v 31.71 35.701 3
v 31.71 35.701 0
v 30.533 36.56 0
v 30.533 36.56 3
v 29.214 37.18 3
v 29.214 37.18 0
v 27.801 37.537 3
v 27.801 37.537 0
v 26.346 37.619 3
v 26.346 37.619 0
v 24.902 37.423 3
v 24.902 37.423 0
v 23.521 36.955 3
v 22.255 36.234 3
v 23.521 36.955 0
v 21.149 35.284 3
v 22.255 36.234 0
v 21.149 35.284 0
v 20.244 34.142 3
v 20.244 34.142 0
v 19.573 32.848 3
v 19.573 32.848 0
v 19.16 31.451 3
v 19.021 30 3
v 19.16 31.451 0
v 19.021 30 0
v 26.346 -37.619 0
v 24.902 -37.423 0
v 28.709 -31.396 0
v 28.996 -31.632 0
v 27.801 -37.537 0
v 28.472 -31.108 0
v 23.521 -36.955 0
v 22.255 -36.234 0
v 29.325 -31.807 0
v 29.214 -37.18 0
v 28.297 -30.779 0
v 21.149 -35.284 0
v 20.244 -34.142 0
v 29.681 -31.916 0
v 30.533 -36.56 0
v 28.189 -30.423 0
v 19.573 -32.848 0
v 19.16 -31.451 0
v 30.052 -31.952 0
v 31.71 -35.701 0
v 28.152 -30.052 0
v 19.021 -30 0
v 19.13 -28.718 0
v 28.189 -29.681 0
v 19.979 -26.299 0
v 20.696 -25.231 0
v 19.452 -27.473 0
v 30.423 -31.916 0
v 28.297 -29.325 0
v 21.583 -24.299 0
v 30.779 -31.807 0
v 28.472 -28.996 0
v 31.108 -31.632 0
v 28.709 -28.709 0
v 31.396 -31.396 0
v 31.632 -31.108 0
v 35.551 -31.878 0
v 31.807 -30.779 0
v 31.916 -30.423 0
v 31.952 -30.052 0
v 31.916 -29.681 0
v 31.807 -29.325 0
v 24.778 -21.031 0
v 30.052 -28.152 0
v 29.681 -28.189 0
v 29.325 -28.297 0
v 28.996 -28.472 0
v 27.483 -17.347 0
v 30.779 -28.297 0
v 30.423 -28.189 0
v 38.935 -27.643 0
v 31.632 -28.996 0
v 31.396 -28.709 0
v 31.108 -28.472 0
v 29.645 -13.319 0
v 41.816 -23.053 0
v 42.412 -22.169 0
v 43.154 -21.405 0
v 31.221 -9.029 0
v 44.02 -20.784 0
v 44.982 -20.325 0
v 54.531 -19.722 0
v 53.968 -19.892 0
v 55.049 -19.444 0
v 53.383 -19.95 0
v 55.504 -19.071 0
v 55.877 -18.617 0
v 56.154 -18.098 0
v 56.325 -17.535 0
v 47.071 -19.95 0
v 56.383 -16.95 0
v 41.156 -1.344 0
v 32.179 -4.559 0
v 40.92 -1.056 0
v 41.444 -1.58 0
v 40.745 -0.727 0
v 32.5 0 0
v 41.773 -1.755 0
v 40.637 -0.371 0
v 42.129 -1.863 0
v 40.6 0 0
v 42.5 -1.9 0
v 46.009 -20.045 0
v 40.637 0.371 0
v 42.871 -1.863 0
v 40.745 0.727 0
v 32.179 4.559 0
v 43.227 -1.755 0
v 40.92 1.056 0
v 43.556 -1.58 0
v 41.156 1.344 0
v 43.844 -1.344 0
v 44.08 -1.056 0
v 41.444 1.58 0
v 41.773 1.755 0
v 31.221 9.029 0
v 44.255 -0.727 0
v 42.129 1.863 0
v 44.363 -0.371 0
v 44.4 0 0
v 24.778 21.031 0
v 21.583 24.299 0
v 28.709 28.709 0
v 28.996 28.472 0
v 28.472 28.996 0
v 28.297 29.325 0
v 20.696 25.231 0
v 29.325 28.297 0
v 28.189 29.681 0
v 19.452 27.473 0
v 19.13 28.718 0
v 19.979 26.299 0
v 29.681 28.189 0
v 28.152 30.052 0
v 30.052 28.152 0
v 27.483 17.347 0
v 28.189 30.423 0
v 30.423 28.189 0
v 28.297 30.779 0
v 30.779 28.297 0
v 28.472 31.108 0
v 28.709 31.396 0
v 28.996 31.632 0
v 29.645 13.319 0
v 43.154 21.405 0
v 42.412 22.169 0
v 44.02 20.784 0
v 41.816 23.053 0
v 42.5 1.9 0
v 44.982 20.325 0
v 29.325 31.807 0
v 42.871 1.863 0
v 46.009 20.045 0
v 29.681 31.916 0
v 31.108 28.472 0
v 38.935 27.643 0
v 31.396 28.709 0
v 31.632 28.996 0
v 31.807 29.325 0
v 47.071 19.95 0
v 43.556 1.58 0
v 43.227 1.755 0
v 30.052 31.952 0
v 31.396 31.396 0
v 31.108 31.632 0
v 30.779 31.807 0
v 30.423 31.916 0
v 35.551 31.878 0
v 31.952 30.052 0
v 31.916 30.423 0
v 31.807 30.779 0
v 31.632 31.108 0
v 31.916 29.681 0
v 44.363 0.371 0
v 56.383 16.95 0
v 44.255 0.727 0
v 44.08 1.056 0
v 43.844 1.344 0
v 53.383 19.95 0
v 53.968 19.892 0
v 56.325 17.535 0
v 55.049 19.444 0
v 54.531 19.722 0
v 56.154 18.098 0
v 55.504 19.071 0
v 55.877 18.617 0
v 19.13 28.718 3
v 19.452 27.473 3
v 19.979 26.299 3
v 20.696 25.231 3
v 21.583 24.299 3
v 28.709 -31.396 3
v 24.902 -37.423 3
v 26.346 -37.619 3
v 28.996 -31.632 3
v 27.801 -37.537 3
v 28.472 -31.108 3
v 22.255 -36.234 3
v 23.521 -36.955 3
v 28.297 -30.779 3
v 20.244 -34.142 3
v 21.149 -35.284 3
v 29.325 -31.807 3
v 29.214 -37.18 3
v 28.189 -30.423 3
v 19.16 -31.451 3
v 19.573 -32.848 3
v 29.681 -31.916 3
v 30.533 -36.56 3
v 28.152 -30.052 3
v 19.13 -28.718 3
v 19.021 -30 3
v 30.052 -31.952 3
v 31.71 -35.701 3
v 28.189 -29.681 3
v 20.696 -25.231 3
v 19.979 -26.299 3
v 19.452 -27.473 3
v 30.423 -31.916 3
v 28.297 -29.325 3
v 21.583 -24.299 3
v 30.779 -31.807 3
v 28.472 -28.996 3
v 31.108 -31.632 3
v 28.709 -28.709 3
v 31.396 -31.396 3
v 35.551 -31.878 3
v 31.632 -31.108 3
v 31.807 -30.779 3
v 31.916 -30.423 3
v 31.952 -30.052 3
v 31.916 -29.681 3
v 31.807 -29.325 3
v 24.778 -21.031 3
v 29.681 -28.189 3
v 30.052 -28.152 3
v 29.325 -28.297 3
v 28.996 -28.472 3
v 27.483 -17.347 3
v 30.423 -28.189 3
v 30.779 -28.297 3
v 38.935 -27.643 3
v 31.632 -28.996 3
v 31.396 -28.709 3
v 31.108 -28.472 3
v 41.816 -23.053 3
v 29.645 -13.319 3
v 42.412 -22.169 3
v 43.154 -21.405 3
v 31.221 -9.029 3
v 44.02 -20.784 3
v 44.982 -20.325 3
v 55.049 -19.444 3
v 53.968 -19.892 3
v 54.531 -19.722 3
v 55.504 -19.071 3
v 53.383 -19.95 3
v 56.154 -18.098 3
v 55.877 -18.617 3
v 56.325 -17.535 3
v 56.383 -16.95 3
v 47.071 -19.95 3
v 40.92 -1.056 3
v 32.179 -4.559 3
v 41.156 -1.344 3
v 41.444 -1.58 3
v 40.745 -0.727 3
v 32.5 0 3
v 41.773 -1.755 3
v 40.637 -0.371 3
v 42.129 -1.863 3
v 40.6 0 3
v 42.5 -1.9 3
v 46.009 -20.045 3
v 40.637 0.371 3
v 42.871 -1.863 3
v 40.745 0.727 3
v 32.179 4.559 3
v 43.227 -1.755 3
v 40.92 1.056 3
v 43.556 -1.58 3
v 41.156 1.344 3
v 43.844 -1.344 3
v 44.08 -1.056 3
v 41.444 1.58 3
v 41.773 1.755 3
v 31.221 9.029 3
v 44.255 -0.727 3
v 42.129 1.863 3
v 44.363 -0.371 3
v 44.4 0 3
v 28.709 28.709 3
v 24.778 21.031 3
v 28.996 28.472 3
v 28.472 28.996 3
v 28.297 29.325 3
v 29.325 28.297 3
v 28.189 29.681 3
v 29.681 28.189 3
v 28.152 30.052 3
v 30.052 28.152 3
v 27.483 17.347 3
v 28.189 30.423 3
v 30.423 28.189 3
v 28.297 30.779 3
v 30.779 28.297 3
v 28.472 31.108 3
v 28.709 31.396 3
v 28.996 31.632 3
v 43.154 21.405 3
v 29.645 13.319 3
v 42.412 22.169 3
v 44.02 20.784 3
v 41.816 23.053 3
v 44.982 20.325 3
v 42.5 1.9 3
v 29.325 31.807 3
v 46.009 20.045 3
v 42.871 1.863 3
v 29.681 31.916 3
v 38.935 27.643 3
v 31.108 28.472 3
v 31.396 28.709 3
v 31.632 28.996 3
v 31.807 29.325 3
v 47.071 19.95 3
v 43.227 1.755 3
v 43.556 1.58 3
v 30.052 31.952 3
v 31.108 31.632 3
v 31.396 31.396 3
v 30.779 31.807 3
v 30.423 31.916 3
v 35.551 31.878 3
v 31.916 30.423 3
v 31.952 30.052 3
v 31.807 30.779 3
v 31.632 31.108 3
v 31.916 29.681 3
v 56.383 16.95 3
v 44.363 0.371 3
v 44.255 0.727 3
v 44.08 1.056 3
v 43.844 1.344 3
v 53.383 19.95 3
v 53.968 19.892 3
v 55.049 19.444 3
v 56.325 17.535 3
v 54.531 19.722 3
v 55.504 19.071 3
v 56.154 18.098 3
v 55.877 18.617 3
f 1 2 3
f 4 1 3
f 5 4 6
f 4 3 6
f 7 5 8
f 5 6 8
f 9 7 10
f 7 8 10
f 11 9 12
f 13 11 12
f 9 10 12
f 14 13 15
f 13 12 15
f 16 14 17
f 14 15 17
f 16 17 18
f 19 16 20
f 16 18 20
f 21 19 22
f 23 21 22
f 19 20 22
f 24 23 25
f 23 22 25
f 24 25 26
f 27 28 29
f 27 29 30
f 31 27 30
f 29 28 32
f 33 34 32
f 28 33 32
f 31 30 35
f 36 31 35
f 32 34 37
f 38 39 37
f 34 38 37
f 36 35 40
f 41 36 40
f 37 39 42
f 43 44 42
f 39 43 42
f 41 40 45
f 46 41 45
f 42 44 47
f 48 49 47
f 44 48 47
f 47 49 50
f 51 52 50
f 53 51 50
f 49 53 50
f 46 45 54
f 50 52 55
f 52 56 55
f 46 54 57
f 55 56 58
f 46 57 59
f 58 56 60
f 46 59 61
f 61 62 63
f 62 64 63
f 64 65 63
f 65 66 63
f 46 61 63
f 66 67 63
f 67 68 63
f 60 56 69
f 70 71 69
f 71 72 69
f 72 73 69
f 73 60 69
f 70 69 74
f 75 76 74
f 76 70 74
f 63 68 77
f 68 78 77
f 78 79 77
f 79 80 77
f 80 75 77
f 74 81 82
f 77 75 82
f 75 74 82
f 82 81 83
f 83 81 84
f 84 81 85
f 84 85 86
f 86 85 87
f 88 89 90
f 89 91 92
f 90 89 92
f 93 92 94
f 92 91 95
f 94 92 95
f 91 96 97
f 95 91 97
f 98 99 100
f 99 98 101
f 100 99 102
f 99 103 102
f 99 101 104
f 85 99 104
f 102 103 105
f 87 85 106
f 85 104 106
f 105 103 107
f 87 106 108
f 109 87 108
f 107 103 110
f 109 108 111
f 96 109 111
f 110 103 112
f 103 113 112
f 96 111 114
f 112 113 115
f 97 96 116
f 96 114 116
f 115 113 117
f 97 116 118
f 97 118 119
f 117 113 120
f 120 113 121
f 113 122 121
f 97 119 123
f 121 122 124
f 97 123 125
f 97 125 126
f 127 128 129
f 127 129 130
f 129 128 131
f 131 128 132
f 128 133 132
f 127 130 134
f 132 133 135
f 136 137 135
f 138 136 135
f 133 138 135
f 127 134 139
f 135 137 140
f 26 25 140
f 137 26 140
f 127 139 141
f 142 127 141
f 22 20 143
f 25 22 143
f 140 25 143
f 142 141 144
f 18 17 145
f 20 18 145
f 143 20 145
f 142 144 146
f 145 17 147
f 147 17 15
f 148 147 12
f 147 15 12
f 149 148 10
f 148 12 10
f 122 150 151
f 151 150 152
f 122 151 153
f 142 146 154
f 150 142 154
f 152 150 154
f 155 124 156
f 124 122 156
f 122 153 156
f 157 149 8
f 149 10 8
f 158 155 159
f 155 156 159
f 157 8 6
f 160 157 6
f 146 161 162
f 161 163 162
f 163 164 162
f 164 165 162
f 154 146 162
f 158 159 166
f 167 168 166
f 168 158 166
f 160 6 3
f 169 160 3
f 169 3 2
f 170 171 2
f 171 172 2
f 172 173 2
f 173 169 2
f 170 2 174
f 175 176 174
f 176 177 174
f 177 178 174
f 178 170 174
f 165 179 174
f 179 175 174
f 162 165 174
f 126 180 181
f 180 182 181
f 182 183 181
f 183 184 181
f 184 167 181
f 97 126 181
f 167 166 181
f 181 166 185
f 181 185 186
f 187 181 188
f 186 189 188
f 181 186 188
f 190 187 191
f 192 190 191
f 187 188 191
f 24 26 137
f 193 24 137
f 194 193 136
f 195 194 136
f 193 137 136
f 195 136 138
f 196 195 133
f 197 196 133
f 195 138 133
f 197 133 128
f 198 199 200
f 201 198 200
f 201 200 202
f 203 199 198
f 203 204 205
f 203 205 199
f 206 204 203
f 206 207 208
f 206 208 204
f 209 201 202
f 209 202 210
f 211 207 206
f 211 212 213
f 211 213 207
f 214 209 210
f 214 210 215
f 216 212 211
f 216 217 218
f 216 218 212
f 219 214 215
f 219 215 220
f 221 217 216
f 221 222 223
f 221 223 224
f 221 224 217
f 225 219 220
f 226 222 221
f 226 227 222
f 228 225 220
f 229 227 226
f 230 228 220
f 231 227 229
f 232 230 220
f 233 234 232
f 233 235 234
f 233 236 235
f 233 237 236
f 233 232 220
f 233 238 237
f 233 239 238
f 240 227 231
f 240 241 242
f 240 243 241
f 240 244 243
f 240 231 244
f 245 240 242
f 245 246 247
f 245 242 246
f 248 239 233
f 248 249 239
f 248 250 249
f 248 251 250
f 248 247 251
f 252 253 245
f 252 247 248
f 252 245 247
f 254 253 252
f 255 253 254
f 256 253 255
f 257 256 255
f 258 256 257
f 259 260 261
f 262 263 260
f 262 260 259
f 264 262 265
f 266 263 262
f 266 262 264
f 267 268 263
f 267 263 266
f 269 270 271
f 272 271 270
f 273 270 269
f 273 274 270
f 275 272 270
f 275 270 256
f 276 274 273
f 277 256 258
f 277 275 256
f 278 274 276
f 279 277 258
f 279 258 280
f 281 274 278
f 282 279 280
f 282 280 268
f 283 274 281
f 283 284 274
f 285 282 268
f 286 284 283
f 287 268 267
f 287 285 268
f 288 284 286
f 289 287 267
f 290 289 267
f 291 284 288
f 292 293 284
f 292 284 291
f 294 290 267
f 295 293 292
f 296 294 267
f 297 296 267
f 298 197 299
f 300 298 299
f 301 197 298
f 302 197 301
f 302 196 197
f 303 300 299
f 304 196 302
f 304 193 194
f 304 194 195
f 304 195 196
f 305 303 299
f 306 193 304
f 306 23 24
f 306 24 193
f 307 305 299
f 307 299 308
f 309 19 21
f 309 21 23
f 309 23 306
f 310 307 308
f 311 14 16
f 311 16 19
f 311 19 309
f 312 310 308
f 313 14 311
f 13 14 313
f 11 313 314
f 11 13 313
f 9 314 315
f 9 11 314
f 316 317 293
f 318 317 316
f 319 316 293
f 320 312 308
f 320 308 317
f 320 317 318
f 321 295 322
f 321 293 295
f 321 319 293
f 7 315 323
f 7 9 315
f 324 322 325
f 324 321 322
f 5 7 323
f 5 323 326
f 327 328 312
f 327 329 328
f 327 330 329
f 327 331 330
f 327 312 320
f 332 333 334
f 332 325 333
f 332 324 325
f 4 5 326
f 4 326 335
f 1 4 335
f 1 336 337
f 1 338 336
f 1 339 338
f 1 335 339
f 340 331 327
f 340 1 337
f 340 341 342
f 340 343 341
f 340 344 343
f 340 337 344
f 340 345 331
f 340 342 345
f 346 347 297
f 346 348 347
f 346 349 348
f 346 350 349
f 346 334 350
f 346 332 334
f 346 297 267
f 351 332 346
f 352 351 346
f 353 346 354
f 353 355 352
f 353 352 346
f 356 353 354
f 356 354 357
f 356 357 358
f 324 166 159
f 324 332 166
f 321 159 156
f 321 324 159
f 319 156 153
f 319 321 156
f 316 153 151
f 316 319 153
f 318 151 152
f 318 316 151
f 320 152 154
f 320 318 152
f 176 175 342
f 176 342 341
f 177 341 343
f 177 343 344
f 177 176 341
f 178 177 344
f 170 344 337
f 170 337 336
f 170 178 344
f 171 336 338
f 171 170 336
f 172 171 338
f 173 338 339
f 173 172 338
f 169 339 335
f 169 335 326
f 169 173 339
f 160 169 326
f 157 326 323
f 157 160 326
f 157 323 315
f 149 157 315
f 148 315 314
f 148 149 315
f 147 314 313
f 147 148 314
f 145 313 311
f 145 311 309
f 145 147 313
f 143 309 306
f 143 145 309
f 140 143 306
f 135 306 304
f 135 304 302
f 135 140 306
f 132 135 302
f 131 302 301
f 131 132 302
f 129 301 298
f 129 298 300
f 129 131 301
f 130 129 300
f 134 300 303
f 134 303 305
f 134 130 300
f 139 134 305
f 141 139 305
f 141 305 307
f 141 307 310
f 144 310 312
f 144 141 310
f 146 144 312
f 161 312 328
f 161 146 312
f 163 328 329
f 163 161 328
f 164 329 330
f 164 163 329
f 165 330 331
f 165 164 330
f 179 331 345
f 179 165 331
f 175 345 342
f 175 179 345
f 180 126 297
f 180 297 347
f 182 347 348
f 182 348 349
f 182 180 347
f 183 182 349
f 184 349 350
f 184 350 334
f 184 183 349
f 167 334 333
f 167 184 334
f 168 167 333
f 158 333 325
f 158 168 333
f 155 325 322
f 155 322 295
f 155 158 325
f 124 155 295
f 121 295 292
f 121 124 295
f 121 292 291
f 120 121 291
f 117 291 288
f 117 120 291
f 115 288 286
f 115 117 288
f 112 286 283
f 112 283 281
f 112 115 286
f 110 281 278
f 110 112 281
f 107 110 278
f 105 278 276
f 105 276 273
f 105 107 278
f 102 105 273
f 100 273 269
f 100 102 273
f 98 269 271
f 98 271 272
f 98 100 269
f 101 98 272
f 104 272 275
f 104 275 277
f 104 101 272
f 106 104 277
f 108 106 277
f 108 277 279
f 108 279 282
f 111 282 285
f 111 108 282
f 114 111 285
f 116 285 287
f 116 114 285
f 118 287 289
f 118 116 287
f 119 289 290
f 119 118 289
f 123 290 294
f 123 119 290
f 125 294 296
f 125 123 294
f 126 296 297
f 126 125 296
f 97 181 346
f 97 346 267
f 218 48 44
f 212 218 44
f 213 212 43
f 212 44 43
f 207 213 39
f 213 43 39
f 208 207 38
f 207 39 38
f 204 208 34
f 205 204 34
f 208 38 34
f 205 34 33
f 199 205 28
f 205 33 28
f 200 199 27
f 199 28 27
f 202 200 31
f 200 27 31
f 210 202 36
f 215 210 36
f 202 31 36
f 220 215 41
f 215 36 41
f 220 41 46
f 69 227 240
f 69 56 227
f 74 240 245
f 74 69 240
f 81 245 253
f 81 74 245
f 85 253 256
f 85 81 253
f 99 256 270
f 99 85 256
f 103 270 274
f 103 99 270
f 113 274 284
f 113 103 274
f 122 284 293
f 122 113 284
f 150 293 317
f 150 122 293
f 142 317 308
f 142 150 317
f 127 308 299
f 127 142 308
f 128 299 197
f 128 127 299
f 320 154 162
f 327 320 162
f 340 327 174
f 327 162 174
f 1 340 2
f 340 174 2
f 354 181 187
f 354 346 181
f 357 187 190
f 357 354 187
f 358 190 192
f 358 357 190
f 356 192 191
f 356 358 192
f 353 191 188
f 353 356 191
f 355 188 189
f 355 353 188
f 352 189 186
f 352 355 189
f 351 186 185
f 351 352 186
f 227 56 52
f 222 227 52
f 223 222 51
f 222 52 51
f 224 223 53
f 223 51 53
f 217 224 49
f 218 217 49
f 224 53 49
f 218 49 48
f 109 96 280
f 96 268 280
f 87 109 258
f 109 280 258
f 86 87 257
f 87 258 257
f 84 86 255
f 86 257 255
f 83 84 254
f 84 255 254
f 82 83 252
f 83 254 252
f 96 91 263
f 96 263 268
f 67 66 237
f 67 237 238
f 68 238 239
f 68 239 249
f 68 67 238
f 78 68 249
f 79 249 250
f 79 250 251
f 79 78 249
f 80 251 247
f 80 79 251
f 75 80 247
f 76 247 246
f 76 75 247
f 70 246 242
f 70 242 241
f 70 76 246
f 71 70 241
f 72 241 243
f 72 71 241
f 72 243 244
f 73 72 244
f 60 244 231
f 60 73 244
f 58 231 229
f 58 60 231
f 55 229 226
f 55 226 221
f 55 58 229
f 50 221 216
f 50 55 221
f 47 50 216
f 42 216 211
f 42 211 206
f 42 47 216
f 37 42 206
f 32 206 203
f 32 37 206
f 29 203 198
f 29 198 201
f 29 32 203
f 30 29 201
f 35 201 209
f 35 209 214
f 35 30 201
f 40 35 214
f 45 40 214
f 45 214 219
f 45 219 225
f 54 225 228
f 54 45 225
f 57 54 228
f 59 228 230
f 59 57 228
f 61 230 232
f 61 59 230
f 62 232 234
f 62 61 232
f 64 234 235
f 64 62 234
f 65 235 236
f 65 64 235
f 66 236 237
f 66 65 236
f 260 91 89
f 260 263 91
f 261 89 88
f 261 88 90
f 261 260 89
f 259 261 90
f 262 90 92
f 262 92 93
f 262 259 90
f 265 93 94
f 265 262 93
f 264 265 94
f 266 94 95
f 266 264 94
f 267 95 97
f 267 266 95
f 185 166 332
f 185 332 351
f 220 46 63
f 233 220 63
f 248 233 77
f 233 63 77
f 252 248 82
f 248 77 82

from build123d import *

# Parameters (mm, degrees)
SKETCH_1_R          = 47.75
SKETCH_1_R_2        = 32.5
SKETCH_1_R_3        = 1.9
EXTRUDE_1_DEPTH     = 3
SKETCH_2_R          = 1.9
CUT_EXTRUDE_1_DEPTH = 3
EXTRUDE_2_DEPTH     = 3
FILLET_1_R          = 3
FILLET_2_R          = 6


with BuildPart() as part:
    # 草图1 → 凸台-拉伸1 (new body)
    with BuildSketch(Plane.XY):
        Circle(SKETCH_1_R)
        Circle(SKETCH_1_R_2, mode=Mode.SUBTRACT)
        with Locations((0, 42.5)):
            Circle(SKETCH_1_R_3, mode=Mode.SUBTRACT)
        with Locations((30.0520382, 30.0520382)):
            Circle(SKETCH_1_R_3, mode=Mode.SUBTRACT)
        with Locations((42.5, 0)):
            Circle(SKETCH_1_R_3, mode=Mode.SUBTRACT)
        with Locations((30.0520382, -30.0520382)):
            Circle(SKETCH_1_R_3, mode=Mode.SUBTRACT)
        with Locations((0, -42.5)):
            Circle(SKETCH_1_R_3, mode=Mode.SUBTRACT)
        with Locations((-30.0520382, -30.0520382)):
            Circle(SKETCH_1_R_3, mode=Mode.SUBTRACT)
        with Locations((-42.5, 0)):
            Circle(SKETCH_1_R_3, mode=Mode.SUBTRACT)
        with Locations((-30.0520382, 30.0520382)):
            Circle(SKETCH_1_R_3, mode=Mode.SUBTRACT)
    extrude(amount=EXTRUDE_1_DEPTH)

    # 草图2 → 切除-拉伸1 (cut)
    # profile 1 of 2: a face of its own
    with BuildSketch(Plane(origin=(0, 0, 0), x_dir=(-1, 0, 0), z_dir=(0, 0, -1))):
        with BuildLine():
            ThreePointArc((40.6, 0), (42.5, 1.9), (44.4, 0))
            Line((44.4, 0), (47.75, 0))
            ThreePointArc((47.75, 0), (19.569412493, 43.555718278), (-31.709710772, 35.700934761))
            ThreePointArc((-31.709710772, 35.700934761), (-23.521159741, 36.955232453), (-19.021118385, 30))
            ThreePointArc((-19.021118385, 30), (-19.69088588, 26.875041473), (-21.582525806, 24.29906541))
            ThreePointArc((-21.582525806, 24.29906541), (13.319495322, 29.645253319), (32.5, 0))
            Line((32.5, 0), (40.6, 0))
        make_face()
        with Locations((0, 42.5)):
            Circle(SKETCH_2_R, mode=Mode.SUBTRACT)
        with Locations((30.0520382, 30.0520382)):
            Circle(SKETCH_2_R, mode=Mode.SUBTRACT)
    # profile 2 of 2: a face of its own
    with BuildSketch(Plane(origin=(0, 0, 0), x_dir=(-1, 0, 0), z_dir=(0, 0, -1))):
        with BuildLine():
            Line((47.75, 0), (44.4, 0))
            ThreePointArc((44.4, 0), (42.5, -1.9), (40.6, 0))
            Line((40.6, 0), (32.5, 0))
            ThreePointArc((32.5, 0), (13.319495418, -29.645253276), (-21.582525651, -24.299065549))
            ThreePointArc((-21.582525651, -24.299065549), (-19.690885837, -26.875041568), (-19.021118385, -30))
            ThreePointArc((-19.021118385, -30), (-23.521159897, -36.955232523), (-31.709711027, -35.700934534))
            ThreePointArc((-31.709711027, -35.700934534), (19.569412338, -43.555718347), (47.75, 0))
        make_face()
        with Locations((0, -42.5)):
            Circle(SKETCH_2_R, mode=Mode.SUBTRACT)
        with Locations((30.0520382, -30.0520382)):
            Circle(SKETCH_2_R, mode=Mode.SUBTRACT)
    extrude(amount=-CUT_EXTRUDE_1_DEPTH, mode=Mode.SUBTRACT)

    # 草图3 → 凸台-拉伸2 (add)
    with BuildSketch(Plane(origin=(0, 0, 0), x_dir=(-1, 0, 0), z_dir=(0, 0, -1))):
        with BuildLine():
            Line((-43.382715452, 19.95), (-56.382715452, 19.95))
            Line((-56.382715452, 19.95), (-56.382715452, 0))
            Line((-56.382715452, 0), (-47.75, 0))
            ThreePointArc((-47.75, 0), (-46.645402575, 10.211215333), (-43.382715452, 19.95))
        make_face()
        with BuildLine():
            Line((-47.75, 0), (-56.382715452, 0))
            Line((-56.382715452, 0), (-56.382715452, -19.95))
            Line((-56.382715452, -19.95), (-43.382715452, -19.95))
            ThreePointArc((-43.382715452, -19.95), (-46.645402575, -10.211215333), (-47.75, 0))
        make_face()
    extrude(amount=-EXTRUDE_2_DEPTH)

    # 圆角1
    fillet_1_edges = [part.edges().sort_by_distance(p)[0] for p in [
        (56.382715452, -19.95, 1.5),
        (56.382715452, 19.95, 1.5),
    ]]
    fillet(fillet_1_edges, radius=FILLET_1_R)

    # 圆角2
    fillet_2_edges = [part.edges().sort_by_distance(p)[0] for p in [
        (43.382715452, 19.95, 1.5),
        (43.382715452, -19.95, 1.5),
    ]]
    fillet(fillet_2_edges, radius=FILLET_2_R)


solid = part.part
